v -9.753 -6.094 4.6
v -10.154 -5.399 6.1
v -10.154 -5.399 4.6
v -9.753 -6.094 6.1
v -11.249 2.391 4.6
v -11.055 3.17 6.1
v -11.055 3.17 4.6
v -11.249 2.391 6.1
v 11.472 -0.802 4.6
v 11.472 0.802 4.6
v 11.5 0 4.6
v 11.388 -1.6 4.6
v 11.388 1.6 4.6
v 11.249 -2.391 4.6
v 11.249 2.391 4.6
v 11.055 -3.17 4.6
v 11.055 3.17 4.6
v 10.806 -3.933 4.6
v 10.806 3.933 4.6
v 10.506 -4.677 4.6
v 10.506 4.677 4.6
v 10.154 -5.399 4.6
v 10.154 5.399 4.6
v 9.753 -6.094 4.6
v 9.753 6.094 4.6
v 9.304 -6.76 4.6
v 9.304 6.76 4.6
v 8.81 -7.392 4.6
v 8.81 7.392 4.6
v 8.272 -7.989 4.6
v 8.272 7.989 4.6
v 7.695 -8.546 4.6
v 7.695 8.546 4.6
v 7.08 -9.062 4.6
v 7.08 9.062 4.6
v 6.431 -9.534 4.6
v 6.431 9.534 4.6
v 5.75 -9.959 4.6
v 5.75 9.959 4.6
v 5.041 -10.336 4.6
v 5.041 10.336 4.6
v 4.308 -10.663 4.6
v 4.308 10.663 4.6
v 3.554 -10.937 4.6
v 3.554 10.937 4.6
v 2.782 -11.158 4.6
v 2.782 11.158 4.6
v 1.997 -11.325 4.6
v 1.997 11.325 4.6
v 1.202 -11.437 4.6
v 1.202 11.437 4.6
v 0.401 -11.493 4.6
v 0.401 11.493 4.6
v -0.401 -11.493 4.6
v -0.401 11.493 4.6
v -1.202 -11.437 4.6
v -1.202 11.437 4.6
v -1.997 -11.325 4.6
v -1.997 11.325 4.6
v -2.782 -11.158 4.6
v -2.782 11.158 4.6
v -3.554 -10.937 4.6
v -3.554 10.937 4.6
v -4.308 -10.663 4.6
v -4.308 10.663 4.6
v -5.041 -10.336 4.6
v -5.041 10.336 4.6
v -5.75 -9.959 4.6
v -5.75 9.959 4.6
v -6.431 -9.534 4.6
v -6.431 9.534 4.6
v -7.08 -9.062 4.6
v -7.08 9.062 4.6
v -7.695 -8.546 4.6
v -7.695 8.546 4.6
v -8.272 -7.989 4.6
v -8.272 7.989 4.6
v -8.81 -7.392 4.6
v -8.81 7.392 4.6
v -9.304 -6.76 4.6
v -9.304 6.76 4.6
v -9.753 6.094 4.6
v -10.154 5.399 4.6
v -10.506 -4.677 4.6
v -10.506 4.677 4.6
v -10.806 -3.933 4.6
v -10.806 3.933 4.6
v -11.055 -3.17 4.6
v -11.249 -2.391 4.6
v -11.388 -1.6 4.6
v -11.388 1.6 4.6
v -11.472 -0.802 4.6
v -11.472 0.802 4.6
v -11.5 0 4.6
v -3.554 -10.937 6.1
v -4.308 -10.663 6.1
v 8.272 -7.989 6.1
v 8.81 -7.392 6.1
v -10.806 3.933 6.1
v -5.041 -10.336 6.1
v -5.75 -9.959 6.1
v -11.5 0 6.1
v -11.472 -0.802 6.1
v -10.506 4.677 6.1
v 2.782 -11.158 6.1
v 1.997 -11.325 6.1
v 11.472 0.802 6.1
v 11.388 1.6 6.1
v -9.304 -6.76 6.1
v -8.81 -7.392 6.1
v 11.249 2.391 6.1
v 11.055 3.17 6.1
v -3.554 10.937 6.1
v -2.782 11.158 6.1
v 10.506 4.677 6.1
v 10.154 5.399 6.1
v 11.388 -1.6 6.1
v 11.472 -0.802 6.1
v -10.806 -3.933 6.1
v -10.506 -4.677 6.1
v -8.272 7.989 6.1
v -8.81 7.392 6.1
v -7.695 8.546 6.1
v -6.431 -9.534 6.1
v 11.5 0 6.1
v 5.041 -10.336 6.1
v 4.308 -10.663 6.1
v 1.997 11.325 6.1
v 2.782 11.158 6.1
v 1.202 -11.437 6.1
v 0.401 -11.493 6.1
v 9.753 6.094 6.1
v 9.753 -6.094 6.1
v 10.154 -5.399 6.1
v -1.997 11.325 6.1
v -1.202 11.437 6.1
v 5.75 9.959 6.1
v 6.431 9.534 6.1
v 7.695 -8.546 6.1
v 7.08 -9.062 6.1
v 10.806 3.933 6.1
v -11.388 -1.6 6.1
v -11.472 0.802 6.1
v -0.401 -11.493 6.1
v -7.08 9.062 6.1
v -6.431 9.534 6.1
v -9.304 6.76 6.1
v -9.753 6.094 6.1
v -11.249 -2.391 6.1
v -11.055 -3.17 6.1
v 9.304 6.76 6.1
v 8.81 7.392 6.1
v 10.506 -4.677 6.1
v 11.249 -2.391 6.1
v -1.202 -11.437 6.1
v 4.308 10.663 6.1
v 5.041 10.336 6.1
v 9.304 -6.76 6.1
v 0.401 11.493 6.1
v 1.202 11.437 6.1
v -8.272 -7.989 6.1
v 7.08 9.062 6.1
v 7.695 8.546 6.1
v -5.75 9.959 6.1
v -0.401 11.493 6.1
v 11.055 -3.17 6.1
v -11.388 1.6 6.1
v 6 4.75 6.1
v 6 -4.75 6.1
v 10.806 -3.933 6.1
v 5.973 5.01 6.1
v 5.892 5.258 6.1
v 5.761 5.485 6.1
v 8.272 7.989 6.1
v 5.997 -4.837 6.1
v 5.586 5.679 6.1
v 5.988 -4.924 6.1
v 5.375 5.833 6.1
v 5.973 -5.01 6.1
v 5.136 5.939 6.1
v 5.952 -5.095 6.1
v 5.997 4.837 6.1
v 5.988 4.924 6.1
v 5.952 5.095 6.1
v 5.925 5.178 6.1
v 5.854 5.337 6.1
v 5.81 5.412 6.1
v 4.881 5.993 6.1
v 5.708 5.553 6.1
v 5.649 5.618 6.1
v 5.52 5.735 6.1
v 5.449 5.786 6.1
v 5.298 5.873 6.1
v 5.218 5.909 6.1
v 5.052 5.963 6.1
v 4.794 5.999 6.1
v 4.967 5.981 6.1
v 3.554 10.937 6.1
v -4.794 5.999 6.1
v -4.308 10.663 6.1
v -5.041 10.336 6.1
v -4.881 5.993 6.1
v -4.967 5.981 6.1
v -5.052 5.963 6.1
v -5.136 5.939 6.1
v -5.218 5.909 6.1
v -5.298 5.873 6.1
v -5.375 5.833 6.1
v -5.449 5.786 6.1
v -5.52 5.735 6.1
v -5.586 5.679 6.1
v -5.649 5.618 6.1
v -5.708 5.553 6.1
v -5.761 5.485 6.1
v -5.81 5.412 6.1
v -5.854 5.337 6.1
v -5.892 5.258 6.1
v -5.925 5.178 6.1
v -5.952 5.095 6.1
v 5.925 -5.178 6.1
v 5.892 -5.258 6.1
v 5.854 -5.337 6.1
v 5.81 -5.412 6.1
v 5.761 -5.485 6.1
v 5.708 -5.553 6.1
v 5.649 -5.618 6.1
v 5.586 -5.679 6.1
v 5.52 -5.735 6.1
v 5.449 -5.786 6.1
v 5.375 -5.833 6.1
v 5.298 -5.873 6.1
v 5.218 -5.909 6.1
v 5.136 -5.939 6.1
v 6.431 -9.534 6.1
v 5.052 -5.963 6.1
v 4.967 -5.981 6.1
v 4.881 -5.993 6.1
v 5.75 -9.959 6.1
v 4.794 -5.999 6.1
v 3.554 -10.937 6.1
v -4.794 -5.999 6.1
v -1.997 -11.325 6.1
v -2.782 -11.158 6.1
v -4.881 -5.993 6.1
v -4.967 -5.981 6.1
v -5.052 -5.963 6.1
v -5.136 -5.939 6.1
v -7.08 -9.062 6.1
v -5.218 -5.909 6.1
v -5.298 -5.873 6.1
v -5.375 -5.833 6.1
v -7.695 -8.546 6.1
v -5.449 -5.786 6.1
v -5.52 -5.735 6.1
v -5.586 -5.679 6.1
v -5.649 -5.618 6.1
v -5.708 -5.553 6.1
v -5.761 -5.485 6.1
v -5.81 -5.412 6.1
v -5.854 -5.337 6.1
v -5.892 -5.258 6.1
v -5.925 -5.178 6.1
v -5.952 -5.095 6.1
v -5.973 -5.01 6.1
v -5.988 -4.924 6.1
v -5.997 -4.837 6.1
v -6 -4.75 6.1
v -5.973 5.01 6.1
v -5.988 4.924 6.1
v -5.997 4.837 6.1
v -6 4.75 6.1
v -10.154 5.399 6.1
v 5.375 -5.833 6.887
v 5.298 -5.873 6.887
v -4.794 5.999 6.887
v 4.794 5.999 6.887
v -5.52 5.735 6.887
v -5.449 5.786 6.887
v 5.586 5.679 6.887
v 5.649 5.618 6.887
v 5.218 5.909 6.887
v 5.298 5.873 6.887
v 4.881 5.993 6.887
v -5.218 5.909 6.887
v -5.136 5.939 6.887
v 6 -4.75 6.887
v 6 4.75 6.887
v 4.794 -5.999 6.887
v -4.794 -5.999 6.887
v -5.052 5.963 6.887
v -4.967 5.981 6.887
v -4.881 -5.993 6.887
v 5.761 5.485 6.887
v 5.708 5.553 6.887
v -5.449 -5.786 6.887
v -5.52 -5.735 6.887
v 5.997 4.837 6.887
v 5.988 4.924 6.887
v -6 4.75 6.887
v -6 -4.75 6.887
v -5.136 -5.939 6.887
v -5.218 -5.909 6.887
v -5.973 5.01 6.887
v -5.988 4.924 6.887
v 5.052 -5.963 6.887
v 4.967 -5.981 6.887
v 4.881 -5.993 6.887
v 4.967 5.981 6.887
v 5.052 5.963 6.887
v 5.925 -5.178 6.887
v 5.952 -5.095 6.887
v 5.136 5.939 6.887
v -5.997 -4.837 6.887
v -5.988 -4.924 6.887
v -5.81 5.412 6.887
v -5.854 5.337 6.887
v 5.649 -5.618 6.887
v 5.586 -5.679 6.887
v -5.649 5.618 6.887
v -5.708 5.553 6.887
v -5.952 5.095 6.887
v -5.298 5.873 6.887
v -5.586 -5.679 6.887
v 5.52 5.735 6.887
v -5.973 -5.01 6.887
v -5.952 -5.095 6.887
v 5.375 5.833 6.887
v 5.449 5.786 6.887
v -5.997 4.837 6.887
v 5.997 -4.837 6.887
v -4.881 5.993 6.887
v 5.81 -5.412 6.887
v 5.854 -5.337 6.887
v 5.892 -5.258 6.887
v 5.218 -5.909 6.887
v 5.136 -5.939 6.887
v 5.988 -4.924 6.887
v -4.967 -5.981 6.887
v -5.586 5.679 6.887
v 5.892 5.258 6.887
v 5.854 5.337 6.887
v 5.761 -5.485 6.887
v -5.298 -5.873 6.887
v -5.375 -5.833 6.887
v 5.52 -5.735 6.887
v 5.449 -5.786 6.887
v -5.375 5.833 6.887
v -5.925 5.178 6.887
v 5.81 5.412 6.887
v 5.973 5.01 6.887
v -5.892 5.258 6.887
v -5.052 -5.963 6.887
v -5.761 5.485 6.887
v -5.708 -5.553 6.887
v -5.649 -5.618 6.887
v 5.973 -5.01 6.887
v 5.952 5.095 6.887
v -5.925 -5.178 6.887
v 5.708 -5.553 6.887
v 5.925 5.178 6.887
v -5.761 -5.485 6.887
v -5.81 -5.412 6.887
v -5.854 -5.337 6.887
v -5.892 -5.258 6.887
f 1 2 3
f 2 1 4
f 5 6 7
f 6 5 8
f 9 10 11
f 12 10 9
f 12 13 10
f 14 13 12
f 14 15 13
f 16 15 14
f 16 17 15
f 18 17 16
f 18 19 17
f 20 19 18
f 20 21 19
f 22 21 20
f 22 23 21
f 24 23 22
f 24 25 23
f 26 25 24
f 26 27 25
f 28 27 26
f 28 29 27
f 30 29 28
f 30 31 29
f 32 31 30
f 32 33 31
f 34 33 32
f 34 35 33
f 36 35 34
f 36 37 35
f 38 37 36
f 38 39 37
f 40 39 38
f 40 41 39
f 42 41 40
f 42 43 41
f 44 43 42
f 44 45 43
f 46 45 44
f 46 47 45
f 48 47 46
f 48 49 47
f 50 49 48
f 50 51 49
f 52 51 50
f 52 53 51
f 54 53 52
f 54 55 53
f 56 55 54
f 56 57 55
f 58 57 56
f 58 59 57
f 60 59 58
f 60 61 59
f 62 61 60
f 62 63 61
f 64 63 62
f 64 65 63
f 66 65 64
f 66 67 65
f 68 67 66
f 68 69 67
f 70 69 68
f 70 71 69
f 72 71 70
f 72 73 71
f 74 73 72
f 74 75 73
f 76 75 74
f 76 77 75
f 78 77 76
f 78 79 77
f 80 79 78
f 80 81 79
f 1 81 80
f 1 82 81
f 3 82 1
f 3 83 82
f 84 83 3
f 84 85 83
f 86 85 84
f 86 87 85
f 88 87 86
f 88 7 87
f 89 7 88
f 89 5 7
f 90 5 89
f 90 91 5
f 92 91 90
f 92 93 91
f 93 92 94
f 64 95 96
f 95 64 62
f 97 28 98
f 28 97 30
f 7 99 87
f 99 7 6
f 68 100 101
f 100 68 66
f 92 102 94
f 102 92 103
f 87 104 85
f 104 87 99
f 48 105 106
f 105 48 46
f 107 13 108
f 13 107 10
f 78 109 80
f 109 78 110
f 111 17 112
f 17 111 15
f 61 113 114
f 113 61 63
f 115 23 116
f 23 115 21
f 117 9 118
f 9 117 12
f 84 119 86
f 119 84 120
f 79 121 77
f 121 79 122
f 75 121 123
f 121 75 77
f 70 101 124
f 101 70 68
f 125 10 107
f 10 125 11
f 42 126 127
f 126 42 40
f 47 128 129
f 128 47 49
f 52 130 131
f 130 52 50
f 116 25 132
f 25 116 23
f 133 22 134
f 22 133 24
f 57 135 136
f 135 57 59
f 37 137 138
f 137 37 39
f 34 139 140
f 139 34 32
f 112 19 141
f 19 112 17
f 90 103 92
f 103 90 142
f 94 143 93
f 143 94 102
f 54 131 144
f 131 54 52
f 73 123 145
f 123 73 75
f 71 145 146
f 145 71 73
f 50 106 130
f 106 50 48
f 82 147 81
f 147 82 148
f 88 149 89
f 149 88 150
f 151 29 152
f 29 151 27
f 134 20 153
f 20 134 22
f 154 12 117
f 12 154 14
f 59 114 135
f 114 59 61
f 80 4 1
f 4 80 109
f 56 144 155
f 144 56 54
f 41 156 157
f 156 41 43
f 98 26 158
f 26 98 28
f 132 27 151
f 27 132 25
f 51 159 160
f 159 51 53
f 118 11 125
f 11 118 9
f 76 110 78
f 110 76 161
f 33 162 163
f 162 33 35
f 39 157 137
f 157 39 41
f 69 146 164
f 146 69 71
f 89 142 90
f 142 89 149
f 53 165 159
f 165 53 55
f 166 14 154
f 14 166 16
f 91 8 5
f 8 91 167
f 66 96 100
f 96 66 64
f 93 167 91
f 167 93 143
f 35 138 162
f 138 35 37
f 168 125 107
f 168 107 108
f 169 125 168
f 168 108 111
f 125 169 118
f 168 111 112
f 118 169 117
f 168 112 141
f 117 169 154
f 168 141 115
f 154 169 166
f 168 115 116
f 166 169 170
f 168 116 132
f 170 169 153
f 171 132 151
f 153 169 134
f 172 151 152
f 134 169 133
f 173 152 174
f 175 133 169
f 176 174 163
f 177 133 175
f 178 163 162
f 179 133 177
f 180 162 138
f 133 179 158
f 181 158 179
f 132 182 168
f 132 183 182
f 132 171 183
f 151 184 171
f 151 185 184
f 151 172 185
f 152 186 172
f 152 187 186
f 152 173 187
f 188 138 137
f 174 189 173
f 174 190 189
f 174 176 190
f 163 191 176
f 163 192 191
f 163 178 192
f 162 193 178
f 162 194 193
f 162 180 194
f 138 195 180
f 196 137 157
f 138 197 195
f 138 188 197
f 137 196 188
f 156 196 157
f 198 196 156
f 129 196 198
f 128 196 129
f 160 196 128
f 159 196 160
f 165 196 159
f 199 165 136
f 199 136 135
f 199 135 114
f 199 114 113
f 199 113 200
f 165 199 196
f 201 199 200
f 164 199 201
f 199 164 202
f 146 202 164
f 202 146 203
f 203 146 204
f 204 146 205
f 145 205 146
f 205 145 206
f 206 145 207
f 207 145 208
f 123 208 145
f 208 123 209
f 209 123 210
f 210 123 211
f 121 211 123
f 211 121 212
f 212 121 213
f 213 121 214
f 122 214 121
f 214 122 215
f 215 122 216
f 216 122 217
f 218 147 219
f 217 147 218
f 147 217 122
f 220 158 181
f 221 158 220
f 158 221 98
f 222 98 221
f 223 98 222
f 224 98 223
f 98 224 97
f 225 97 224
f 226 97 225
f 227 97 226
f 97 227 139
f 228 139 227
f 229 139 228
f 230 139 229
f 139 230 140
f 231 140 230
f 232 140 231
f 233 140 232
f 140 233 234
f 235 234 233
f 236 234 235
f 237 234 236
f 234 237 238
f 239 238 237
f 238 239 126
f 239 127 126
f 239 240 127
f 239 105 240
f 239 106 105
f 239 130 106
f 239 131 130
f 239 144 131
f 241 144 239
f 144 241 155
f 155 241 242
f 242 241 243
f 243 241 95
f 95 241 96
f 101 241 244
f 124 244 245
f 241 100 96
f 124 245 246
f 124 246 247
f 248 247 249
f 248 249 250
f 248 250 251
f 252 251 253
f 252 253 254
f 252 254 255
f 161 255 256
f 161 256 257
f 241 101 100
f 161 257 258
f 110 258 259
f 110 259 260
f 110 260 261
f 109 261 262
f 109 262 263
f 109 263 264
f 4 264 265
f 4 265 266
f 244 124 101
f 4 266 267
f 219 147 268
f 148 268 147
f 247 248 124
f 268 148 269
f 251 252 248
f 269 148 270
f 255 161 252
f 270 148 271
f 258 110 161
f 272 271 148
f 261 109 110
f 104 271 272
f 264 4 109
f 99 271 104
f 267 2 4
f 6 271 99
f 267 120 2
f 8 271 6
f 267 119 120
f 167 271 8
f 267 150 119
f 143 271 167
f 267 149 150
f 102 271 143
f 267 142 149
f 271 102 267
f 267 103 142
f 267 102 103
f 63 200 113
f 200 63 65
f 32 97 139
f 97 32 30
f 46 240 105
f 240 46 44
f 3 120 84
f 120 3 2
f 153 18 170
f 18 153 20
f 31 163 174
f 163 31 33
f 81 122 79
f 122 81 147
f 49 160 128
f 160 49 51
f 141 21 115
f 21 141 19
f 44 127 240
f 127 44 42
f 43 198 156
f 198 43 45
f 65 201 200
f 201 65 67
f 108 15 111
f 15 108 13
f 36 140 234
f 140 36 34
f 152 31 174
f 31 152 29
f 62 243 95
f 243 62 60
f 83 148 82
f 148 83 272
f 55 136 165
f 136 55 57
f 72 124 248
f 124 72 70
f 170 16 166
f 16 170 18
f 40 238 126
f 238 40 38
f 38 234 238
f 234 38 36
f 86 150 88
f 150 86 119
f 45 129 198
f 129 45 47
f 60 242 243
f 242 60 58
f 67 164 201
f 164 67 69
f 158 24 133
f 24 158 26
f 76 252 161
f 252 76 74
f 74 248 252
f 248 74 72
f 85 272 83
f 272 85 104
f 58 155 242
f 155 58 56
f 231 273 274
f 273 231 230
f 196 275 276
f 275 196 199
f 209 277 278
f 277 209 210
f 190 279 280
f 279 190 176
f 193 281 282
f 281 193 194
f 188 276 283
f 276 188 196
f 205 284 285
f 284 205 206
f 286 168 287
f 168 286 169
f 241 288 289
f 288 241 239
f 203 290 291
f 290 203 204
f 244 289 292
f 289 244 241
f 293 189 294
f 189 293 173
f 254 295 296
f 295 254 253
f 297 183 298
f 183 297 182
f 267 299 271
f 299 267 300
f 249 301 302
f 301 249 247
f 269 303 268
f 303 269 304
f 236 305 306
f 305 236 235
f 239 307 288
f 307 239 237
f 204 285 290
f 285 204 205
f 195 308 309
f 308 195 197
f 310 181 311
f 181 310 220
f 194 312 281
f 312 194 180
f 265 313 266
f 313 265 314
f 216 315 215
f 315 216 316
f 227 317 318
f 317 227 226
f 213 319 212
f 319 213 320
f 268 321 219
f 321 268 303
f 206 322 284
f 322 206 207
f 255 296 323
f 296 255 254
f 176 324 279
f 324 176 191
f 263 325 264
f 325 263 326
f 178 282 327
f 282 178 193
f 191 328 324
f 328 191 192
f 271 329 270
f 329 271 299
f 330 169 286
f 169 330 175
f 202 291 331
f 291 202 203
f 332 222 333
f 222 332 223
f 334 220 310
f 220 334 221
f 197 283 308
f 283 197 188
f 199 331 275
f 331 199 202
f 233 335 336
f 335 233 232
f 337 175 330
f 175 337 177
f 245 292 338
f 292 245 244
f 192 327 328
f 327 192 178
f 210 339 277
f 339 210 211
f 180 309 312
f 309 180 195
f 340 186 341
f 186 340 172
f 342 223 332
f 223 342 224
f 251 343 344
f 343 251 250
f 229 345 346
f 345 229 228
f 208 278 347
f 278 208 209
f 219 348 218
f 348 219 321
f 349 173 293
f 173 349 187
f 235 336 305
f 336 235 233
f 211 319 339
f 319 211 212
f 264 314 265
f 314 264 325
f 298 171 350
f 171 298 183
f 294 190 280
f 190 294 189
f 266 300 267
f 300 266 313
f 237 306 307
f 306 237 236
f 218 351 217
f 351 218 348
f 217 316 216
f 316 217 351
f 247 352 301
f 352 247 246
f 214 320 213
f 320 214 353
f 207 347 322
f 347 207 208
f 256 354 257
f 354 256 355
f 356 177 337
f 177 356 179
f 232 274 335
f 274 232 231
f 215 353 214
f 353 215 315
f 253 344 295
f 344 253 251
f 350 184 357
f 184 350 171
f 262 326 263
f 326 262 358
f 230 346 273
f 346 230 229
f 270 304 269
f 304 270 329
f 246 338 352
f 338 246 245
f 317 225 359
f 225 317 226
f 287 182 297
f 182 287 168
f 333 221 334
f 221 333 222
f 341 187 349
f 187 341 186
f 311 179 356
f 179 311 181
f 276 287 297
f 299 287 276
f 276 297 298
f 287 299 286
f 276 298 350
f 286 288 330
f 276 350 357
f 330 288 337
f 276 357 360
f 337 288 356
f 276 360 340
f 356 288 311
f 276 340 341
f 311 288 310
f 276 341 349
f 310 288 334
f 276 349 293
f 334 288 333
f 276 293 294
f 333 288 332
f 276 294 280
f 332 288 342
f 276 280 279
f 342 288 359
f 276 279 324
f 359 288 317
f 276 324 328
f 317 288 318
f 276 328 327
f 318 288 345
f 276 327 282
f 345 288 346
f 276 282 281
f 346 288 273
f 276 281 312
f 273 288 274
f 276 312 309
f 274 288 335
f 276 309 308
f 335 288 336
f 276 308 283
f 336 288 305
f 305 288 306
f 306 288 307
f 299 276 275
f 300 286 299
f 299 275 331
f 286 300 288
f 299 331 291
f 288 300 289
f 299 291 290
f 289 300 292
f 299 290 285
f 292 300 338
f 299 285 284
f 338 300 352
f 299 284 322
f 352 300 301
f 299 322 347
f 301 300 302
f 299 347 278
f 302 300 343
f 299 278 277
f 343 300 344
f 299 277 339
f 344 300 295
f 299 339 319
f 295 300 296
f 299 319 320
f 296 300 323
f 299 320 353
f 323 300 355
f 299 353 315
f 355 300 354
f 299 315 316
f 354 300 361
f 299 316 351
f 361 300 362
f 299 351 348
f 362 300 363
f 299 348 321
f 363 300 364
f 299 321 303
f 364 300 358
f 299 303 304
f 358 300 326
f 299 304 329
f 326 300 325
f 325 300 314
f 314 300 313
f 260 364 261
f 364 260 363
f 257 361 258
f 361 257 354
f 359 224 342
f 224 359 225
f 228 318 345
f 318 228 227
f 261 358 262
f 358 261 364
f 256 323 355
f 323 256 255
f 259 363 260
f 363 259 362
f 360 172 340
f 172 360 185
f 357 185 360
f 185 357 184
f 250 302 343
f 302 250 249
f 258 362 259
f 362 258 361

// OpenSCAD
$fn=90;
//Breite
a=1.75;
c=1.5;
t=14.3;

//a+b+c+d=8.2;
//Berechnungen siehe S-Note
b=2.85;
d=2.1;

//Durchmesser
da=13.75;
db=9.75;
dc=23;
dd=12;

dre=2.5; //Durchmesser gerundete Ecke

module abasics()
{
cylinder(h=a,d=da);

translate([0,0,a])
cylinder(h=b,d=db);

}

module cplate()
{
    translate([0,0,a+b])
cylinder(h=c,d=dc);
}

//abasics();
cplate();
dmiddle();

se=dd/2-dre/2;

module dmiddle()
{
translate([0,0,a+b+c])
scale([1,1,0.25])
minkowski()
{
//translate([0,0,a+b+c])
cube([dd-dre,dd-dre,d], center=true);

//translate([se,se,a+b+c-d/2])
cylinder(h=d,d=dre);
}
}
